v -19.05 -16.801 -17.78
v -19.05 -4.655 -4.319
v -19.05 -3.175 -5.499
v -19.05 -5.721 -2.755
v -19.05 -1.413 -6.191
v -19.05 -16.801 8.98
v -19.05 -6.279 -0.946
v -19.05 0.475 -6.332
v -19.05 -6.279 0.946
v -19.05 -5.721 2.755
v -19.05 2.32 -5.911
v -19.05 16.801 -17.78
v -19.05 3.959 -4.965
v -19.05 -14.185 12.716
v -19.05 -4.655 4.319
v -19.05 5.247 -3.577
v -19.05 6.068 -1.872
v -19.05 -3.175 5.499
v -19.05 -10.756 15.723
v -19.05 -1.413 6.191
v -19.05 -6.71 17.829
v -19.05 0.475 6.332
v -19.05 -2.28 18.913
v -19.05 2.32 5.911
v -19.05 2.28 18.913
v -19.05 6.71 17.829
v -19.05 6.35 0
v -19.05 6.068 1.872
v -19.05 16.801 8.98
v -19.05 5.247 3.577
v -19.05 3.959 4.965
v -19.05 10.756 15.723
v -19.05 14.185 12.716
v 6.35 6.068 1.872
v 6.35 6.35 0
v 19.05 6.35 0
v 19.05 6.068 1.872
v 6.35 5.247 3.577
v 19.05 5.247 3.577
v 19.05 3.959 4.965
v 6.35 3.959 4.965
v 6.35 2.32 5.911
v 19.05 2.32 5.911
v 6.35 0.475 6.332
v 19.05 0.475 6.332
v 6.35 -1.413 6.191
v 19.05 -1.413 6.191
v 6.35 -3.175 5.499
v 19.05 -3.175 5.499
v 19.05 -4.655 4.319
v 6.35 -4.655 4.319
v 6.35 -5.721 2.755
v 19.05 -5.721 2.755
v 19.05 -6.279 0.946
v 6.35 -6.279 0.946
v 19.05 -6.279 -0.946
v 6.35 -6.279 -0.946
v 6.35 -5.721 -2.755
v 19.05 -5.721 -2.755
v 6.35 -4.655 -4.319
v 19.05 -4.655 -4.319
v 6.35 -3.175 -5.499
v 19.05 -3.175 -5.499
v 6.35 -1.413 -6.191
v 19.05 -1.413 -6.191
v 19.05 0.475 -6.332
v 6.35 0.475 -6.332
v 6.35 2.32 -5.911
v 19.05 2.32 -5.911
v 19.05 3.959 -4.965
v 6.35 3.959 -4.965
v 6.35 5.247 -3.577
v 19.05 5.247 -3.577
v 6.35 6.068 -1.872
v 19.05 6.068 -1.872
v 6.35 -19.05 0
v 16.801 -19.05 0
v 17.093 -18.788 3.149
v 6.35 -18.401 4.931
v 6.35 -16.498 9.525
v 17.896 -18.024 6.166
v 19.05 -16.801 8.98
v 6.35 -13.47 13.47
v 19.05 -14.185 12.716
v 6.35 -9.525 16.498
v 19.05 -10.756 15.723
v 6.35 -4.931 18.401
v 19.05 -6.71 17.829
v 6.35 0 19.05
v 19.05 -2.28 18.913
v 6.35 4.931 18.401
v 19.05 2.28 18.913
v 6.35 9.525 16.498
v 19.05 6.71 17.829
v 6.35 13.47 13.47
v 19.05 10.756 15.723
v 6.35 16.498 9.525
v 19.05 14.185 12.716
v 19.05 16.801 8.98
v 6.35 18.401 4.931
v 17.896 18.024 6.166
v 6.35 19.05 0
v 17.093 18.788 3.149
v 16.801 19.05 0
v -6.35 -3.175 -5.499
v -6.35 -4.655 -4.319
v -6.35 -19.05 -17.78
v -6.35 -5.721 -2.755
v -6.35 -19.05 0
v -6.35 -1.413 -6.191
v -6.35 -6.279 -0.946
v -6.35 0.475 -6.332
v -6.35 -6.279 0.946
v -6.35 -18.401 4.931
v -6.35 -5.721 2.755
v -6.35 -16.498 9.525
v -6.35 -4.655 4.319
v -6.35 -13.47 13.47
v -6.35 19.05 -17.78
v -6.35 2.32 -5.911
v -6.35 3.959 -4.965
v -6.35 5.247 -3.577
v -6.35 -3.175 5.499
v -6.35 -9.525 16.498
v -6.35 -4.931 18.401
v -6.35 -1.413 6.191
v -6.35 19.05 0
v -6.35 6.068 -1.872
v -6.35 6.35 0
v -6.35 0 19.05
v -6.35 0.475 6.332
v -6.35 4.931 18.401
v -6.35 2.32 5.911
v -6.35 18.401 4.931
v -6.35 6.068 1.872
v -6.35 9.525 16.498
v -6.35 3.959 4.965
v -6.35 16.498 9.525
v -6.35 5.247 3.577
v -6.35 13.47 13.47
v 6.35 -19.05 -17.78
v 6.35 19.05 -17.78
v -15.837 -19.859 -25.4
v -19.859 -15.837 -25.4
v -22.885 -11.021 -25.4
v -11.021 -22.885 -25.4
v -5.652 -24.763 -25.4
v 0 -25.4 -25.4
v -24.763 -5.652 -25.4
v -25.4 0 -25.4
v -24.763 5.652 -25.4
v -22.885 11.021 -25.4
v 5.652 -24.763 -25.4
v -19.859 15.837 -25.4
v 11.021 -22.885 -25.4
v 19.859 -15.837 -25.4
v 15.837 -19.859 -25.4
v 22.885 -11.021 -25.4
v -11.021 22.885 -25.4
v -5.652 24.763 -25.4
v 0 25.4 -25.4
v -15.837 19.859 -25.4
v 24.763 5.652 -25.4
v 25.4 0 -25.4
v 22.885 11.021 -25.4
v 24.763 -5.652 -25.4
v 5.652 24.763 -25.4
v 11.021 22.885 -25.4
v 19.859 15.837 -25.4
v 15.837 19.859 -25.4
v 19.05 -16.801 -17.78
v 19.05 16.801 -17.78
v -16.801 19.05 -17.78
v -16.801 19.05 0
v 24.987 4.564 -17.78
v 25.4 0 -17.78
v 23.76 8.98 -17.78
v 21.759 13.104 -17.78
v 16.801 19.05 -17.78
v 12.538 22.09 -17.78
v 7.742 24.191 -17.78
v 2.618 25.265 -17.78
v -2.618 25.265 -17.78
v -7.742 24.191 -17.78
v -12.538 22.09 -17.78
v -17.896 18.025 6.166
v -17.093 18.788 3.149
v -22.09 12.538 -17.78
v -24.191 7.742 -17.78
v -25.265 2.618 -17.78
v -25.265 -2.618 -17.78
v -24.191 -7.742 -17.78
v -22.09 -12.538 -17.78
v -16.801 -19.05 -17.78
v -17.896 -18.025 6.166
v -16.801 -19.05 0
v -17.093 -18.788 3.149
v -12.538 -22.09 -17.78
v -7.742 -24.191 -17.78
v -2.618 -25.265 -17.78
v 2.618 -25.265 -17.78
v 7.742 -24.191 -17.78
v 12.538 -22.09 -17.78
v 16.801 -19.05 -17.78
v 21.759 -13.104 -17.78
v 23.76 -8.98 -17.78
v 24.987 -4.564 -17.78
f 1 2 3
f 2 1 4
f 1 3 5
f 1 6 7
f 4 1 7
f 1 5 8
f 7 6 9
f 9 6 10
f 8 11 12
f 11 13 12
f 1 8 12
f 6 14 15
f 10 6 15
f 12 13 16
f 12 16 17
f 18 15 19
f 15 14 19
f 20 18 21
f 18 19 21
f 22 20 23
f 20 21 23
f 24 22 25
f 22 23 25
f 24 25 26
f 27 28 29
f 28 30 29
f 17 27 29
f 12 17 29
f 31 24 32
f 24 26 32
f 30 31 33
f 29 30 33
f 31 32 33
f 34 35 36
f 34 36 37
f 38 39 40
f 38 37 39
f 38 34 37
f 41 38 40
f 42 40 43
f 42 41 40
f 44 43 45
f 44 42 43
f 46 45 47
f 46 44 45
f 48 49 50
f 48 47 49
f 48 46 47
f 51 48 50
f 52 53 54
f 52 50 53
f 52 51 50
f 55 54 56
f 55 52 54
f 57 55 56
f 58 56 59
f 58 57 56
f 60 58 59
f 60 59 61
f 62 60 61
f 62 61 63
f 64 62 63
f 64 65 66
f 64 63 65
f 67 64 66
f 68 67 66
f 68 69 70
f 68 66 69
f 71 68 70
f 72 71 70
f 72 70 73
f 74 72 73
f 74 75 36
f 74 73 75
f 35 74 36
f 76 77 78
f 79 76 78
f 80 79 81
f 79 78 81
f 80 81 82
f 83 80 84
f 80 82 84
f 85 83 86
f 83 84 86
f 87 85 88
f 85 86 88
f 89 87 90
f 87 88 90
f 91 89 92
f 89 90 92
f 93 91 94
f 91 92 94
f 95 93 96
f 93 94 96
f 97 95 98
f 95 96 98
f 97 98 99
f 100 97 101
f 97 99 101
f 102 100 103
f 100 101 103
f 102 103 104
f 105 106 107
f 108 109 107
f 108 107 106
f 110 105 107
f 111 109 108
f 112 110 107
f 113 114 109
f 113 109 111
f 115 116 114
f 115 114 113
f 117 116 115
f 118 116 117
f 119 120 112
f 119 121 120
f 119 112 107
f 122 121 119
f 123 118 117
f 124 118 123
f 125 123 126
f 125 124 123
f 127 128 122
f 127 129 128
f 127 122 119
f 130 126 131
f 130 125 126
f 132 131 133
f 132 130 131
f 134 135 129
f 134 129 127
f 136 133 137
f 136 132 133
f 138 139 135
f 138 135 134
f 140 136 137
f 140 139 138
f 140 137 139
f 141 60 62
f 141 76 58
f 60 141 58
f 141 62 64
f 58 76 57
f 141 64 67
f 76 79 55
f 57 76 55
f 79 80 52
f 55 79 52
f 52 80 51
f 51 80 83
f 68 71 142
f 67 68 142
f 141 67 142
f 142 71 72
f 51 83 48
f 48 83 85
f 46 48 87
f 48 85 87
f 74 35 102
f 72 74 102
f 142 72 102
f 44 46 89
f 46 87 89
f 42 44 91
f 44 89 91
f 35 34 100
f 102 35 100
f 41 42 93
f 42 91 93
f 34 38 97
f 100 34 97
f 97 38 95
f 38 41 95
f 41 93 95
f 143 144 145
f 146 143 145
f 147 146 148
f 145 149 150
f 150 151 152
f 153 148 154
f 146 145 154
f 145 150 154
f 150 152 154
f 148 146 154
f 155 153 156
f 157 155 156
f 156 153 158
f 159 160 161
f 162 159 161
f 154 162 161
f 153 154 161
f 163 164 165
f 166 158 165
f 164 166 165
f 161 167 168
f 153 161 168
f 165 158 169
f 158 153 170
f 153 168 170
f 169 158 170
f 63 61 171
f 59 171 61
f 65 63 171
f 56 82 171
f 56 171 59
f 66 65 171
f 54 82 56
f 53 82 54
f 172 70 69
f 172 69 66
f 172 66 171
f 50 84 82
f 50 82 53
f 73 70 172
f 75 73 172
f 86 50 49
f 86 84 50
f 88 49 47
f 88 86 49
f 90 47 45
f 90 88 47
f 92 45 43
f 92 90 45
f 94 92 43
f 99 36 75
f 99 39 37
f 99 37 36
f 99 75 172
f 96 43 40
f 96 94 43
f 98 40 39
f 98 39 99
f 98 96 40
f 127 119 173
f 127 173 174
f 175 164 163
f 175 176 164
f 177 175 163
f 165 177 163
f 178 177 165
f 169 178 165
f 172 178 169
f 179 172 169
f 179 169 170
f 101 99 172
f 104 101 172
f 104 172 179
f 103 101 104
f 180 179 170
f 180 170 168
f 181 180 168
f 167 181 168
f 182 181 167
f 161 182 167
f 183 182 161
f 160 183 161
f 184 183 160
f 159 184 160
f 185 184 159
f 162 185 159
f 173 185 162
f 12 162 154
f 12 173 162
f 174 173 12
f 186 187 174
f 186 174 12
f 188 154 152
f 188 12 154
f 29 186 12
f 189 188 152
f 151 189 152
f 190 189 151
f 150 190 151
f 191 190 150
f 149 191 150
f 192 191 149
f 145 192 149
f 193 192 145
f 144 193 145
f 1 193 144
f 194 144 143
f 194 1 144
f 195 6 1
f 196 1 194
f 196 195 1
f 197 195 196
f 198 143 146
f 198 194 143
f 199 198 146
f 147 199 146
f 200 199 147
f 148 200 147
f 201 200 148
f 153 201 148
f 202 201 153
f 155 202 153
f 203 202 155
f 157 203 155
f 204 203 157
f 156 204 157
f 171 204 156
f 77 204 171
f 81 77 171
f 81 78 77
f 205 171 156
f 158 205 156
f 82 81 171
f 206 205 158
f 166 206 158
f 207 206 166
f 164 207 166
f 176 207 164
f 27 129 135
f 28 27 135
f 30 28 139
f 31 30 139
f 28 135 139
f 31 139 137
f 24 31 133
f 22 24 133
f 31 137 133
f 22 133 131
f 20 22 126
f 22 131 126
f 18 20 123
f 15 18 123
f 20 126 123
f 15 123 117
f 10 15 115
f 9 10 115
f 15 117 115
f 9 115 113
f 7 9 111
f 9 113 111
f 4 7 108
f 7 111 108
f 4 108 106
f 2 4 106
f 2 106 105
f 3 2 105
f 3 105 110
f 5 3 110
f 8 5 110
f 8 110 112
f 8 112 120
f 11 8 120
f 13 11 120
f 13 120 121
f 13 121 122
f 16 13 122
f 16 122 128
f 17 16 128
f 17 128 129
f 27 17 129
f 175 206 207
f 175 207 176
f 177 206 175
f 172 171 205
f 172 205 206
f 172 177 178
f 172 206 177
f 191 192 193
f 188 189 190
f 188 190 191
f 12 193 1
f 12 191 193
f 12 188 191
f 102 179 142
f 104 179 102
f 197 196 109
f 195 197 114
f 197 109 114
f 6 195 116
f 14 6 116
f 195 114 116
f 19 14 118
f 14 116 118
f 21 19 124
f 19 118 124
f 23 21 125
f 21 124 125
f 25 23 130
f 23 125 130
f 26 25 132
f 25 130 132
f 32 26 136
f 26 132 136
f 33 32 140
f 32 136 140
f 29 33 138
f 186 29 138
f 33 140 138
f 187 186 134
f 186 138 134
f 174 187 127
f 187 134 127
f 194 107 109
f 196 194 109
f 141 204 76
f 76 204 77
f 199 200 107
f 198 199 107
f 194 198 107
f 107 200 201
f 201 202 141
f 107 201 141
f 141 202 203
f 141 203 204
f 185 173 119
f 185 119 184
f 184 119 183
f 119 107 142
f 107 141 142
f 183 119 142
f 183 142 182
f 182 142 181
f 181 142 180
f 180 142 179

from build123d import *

# Parameters (mm, degrees)
F0_R     = 25.4
F1_DEPTH = 25.4
F2_W     = 12.7
F2_H     = 76.2
F3_DEPTH = 43.18
F4_R     = 6.35
F4_W     = 19.05
F4_H     = 17.78
F5_DEPTH = 25.4


with BuildPart() as f1:
    # F0 (on Top) → F1 (new body, symmetric)
    with BuildSketch(Plane.XY):
        Circle(F0_R)
    extrude(amount=F1_DEPTH, both=True)

    # F2 (on face) → F3 (cut)
    with BuildSketch(Plane.XY.offset(25.4)):
        Rectangle(F2_W, F2_H)
        with Locations((25.4, 0)):
            Rectangle(F2_W, F2_H)
        with Locations((-25.4, 0)):
            Rectangle(F2_W, F2_H)
    extrude(amount=-F3_DEPTH, mode=Mode.SUBTRACT)

    # F4 (on Right) → F5 (cut, symmetric)
    with BuildSketch(Plane.YZ):
        Circle(F4_R)
        with BuildLine():
            ThreePointArc((-19.05, 0), (0, 19.05), (19.05, 0))
            Line((19.05, 0), (38.1, 0))
            Line((38.1, 0), (38.1, 38.1))
            Line((38.1, 38.1), (-38.1, 38.1))
            Line((-38.1, 38.1), (-38.1, 0))
            Line((-38.1, 0), (-19.05, 0))
        make_face()
        with Locations((28.575, -8.89)):
            Rectangle(F4_W, F4_H)
        with Locations((-28.575, -8.89)):
            Rectangle(F4_W, F4_H)
    extrude(amount=F5_DEPTH, both=True, mode=Mode.SUBTRACT)


solid = f1.part
